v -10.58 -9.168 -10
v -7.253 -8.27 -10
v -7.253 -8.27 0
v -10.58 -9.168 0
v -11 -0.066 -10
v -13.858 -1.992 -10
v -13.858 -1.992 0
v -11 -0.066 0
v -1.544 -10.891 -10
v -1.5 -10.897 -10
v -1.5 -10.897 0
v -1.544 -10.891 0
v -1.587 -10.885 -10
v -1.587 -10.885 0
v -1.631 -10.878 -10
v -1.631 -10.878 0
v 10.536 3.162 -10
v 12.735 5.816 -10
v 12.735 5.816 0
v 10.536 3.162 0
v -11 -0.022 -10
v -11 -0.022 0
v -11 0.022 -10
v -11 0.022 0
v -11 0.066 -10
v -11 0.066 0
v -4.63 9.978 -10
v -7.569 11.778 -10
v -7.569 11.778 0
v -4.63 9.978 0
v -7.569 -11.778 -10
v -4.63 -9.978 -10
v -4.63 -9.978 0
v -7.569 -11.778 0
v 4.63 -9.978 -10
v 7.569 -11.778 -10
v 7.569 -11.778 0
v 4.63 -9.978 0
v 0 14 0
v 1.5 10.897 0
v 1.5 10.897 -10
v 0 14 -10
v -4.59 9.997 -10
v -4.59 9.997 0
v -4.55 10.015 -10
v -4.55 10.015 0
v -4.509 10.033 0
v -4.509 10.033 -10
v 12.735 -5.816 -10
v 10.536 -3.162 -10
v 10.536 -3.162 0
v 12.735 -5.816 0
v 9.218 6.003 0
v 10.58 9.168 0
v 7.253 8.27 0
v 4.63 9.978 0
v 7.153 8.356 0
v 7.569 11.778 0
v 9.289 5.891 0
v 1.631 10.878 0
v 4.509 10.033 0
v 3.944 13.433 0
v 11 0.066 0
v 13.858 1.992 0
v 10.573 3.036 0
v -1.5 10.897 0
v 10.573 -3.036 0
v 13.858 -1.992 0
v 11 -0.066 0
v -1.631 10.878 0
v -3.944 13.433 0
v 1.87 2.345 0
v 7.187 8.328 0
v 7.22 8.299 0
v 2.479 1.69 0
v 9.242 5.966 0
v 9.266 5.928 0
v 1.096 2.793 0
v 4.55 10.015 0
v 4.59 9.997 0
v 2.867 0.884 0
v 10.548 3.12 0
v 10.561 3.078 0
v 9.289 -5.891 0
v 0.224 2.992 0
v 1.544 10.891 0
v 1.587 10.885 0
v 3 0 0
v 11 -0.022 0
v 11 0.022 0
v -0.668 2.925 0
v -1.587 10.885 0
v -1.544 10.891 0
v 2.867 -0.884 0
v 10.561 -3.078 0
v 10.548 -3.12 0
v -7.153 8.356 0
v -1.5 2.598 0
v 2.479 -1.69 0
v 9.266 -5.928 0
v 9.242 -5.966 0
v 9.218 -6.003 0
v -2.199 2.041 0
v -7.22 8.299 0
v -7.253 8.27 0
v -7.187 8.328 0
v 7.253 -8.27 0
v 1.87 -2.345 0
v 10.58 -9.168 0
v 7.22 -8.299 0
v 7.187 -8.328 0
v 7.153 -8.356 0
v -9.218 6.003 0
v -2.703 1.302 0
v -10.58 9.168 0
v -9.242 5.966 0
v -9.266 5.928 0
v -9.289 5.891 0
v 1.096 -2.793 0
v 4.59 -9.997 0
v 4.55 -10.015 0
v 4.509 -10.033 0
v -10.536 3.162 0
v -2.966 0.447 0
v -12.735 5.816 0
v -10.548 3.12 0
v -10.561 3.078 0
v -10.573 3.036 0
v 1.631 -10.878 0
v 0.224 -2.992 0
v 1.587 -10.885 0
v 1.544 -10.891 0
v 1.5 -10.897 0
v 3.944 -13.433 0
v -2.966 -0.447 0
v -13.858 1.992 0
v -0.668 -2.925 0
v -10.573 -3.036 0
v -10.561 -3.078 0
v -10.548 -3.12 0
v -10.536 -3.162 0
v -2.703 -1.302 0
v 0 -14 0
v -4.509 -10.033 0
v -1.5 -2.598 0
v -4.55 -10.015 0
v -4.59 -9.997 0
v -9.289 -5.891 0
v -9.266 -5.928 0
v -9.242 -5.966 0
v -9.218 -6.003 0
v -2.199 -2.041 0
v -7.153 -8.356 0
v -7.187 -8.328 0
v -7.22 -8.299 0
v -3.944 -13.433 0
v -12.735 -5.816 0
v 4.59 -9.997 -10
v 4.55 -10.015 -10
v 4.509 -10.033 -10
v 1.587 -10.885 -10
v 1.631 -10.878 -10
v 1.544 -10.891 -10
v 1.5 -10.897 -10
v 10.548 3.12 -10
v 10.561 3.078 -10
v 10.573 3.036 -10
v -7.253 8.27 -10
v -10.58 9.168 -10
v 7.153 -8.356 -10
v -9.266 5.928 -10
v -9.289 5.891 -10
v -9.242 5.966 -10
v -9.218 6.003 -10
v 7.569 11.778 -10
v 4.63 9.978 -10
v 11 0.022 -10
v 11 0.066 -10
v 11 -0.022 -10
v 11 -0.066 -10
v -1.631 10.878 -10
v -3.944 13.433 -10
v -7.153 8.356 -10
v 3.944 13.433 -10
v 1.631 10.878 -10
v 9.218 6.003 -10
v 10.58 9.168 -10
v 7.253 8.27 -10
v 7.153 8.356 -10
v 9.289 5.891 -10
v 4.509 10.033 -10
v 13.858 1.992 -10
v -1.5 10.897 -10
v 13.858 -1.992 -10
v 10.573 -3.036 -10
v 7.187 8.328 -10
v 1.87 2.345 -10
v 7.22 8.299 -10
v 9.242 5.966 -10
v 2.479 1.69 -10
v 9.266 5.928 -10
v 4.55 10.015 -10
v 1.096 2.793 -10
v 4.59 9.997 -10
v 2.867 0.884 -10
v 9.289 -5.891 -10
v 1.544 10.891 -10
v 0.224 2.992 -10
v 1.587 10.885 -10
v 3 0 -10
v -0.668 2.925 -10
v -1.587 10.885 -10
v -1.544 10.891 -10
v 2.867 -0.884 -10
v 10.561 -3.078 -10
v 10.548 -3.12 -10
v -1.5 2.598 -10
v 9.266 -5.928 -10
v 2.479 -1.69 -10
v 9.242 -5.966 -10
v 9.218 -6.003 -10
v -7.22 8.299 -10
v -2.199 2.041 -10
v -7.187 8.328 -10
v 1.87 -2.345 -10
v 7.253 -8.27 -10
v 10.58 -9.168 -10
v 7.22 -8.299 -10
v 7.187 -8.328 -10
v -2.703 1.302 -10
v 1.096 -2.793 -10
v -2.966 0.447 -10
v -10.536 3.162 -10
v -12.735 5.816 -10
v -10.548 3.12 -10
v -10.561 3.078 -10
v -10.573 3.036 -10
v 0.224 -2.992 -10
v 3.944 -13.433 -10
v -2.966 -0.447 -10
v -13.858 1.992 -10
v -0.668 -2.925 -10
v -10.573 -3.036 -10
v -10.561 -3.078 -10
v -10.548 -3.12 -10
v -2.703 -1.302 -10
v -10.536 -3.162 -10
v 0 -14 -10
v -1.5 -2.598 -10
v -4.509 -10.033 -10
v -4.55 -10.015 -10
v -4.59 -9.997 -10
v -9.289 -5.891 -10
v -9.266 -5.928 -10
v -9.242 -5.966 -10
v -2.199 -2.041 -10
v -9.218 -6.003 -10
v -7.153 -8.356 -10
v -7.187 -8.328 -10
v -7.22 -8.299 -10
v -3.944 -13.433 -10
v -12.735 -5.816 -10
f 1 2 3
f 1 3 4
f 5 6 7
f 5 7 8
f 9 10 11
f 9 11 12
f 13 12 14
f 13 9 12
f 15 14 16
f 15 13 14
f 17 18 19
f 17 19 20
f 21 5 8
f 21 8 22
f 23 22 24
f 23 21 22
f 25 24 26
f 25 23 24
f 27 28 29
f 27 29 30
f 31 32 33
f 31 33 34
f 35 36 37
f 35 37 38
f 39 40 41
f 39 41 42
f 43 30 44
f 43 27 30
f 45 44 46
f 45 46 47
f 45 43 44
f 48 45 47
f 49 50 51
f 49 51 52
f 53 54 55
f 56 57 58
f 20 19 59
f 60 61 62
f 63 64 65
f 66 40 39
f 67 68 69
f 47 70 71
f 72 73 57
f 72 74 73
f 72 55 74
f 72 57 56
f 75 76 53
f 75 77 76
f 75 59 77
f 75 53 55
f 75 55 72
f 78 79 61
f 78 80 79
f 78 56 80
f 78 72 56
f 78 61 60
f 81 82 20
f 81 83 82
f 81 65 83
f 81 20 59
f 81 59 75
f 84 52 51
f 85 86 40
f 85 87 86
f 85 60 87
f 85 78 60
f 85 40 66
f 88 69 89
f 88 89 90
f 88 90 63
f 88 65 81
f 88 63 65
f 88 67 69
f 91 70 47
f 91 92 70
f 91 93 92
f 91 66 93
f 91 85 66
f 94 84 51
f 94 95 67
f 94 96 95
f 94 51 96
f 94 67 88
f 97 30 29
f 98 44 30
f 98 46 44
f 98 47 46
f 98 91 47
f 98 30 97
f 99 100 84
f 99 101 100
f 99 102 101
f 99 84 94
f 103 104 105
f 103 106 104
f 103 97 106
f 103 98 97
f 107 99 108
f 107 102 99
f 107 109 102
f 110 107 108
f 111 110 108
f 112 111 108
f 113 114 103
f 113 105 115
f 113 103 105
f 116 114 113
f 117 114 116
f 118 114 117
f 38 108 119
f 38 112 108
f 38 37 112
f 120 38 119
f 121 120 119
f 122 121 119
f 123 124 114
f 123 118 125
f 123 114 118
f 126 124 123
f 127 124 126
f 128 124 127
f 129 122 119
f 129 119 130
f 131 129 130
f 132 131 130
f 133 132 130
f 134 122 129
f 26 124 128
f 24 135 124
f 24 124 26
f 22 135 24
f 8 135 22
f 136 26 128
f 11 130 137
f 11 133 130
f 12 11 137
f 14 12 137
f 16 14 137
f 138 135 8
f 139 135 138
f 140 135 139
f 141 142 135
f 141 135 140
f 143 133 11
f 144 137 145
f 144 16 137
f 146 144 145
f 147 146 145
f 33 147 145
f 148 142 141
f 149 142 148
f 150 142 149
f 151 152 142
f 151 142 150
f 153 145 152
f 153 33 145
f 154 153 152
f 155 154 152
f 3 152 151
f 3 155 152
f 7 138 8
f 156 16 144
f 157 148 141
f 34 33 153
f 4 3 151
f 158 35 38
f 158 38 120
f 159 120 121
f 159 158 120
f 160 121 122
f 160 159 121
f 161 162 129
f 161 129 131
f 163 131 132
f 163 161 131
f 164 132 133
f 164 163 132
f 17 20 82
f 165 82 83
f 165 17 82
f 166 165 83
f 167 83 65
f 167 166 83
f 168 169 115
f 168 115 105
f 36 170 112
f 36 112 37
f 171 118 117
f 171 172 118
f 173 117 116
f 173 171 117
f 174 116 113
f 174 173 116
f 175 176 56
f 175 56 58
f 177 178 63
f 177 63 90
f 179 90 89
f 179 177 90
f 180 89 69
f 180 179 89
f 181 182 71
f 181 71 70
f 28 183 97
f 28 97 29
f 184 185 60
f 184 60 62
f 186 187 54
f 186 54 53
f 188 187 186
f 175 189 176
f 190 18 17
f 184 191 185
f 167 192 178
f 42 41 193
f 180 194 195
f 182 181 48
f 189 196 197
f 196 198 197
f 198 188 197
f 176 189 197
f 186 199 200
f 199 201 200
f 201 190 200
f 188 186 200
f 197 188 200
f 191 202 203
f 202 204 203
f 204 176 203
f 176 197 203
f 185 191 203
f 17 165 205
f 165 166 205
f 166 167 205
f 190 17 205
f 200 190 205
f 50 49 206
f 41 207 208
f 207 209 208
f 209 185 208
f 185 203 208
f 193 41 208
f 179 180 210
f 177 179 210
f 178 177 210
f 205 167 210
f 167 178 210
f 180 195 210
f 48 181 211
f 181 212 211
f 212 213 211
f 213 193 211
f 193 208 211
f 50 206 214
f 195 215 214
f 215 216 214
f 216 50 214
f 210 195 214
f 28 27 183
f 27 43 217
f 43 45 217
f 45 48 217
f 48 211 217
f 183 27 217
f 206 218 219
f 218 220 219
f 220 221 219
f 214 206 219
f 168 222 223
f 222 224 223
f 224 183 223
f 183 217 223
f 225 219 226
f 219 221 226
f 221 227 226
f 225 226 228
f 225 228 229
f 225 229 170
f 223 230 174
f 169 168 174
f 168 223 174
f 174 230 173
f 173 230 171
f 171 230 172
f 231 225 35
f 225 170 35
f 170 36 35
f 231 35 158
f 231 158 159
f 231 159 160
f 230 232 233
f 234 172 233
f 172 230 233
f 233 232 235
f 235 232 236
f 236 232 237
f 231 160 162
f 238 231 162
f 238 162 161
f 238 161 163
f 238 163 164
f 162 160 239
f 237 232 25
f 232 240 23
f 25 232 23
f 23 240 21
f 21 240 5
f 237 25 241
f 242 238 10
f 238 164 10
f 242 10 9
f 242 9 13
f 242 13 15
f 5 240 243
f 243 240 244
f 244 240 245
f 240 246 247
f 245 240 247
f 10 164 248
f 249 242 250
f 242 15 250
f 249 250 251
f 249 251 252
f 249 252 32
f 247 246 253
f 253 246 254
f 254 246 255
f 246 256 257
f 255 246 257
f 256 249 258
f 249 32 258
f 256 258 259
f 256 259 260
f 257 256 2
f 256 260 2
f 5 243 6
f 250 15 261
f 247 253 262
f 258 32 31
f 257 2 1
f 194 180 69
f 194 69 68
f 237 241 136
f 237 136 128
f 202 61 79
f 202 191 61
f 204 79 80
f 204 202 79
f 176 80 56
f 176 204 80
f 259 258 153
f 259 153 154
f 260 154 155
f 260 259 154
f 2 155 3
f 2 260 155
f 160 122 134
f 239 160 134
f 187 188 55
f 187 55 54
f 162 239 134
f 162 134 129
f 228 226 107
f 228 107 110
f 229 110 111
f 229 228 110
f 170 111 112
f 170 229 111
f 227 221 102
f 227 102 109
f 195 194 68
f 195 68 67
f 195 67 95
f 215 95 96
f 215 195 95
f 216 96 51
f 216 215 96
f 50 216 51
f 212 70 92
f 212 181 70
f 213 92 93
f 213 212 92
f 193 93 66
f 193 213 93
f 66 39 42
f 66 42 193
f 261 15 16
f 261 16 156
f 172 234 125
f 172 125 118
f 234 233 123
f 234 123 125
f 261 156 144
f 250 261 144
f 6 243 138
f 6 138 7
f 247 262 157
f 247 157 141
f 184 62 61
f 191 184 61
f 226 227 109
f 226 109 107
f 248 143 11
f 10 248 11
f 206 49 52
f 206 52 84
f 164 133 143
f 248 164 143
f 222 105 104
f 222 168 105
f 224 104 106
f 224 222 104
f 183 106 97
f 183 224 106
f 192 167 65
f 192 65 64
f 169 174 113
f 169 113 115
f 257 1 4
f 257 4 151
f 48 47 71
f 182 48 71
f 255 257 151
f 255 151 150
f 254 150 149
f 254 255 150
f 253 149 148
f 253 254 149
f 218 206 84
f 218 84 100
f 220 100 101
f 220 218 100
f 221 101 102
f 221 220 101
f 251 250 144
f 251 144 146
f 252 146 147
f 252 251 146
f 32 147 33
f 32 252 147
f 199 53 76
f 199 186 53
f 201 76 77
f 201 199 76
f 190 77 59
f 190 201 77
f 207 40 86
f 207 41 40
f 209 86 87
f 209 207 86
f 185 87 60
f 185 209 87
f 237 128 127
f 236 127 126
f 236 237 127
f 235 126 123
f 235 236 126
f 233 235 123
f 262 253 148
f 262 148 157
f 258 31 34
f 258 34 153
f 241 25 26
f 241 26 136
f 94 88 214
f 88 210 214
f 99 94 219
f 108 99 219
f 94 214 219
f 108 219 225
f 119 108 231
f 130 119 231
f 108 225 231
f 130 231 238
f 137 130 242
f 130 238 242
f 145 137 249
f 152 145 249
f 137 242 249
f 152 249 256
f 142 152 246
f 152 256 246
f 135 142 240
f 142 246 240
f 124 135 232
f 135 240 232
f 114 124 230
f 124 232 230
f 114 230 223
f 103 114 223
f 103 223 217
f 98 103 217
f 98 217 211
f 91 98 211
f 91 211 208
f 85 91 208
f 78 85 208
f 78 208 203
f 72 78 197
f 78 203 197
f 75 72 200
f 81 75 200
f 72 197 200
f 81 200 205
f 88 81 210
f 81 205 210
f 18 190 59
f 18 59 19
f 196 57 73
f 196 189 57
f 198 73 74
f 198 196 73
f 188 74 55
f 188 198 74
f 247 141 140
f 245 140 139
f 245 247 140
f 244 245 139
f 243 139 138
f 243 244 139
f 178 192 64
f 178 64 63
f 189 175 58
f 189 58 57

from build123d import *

# Parameters (mm, degrees)
ESQUISSE2_W        = 10
ESQUISSE2_H        = 8
BOSS_EXTRU_1_START = -10
BOSS_EXTRU_1_DEPTH = 10


with BuildPart() as part:
    # Esquisse2 → Révolution1 (revolve)
    with BuildSketch(Plane(origin=(0, 0, 0), x_dir=(0, 0, -1), z_dir=(1, 0, 0)), mode=Mode.PRIVATE) as r_volution1_sk:
        with Locations((5, 7)):
            Rectangle(ESQUISSE2_W, ESQUISSE2_H)
    revolve(r_volution1_sk.sketch.rotate(Axis((0, 0, 0), (0, 0, -1)), 90), axis=Axis((0, 0, 0), (0, 0, -1)))

    # Esquisse3 → Boss.-Extru.1 (add)
    with BuildSketch(Plane.XY.offset(BOSS_EXTRU_1_START)):
        with BuildLine():
            Line((0, 14), (-1.5, 10.897247359))
            ThreePointArc((-1.5, 10.897247359), (-0.751757625, 10.974281775), (0, 11))
            ThreePointArc((0, 11), (0.751757625, 10.974281775), (1.5, 10.897247359))
            Line((1.5, 10.897247359), (0, 14))
        make_face()
        with BuildLine():
            Line((3.944255796, 13.432901631), (4.509348821, 10.033233437))
            ThreePointArc((4.509348821, 10.033233437), (3.813118623, 10.317951656), (3.099058125, 10.55442271))
            ThreePointArc((3.099058125, 10.55442271), (2.370506305, 10.741540851), (1.630869901, 10.878431108))
            Line((1.630869901, 10.878431108), (3.944255796, 13.432901631))
        make_face()
        with BuildLine():
            Line((7.568971444, 11.77754946), (7.153377019, 8.356386613))
            ThreePointArc((7.153377019, 8.356386613), (6.565563427, 8.825722457), (5.947048992, 9.253788861))
            ThreePointArc((5.947048992, 9.253788861), (5.300725912, 9.63858417), (4.629616421, 9.978309065))
            Line((4.629616421, 9.978309065), (7.568971444, 11.77754946))
        make_face()
        with BuildLine():
            Line((10.580494041, 9.168050275), (9.217881154, 6.002555042))
            ThreePointArc((9.217881154, 6.002555042), (8.78610533, 6.618485713), (8.313245318, 7.203468073))
            ThreePointArc((8.313245318, 7.203468073), (7.80151223, 7.754766722), (7.253298952, 8.269803765))
            Line((7.253298952, 8.269803765), (10.580494041, 9.168050275))
        make_face()
        with BuildLine():
            Line((12.734847935, 5.815810182), (10.535607378, 3.16243216))
            ThreePointArc((10.535607378, 3.16243216), (10.294849232, 3.875058618), (10.005951949, 4.569565143))
            ThreePointArc((10.005951949, 4.569565143), (9.670266425, 5.242704194), (9.289362339, 5.891328146))
            Line((9.289362339, 5.891328146), (12.734847935, 5.815810182))
        make_face()
        with BuildLine():
            Line((13.857500186, 1.992407736), (10.999801351, 0.066107833))
            ThreePointArc((10.999801351, 0.066107833), (10.969565675, 0.81769732), (10.888035861, 1.565463221))
            ThreePointArc((10.888035861, 1.565463221), (10.755593145, 2.305908952), (10.572856836, 3.035572158))
            Line((10.572856836, 3.035572158), (13.857500186, 1.992407736))
        make_face()
        with BuildLine():
            Line((13.857500186, -1.992407736), (10.572856836, -3.035572158))
            ThreePointArc((10.572856836, -3.035572158), (10.755593145, -2.305908952), (10.888035861, -1.565463221))
            ThreePointArc((10.888035861, -1.565463221), (10.969565675, -0.81769732), (10.999801351, -0.066107833))
            Line((10.999801351, -0.066107833), (13.857500186, -1.992407736))
        make_face()
        with BuildLine():
            Line((12.734847935, -5.815810182), (9.289362339, -5.891328146))
            ThreePointArc((9.289362339, -5.891328146), (9.670266425, -5.242704194), (10.005951949, -4.569565143))
            ThreePointArc((10.005951949, -4.569565143), (10.294849232, -3.875058618), (10.535607378, -3.16243216))
            Line((10.535607378, -3.16243216), (12.734847935, -5.815810182))
        make_face()
        with BuildLine():
            Line((10.580494041, -9.168050275), (7.253298952, -8.269803765))
            ThreePointArc((7.253298952, -8.269803765), (7.80151223, -7.754766722), (8.313245318, -7.203468073))
            ThreePointArc((8.313245318, -7.203468073), (8.78610533, -6.618485713), (9.217881154, -6.002555042))
            Line((9.217881154, -6.002555042), (10.580494041, -9.168050275))
        make_face()
        with BuildLine():
            Line((7.568971444, -11.77754946), (4.629616421, -9.978309065))
            ThreePointArc((4.629616421, -9.978309065), (5.300725912, -9.63858417), (5.947048992, -9.253788861))
            ThreePointArc((5.947048992, -9.253788861), (6.565563427, -8.825722457), (7.153377019, -8.356386613))
            Line((7.153377019, -8.356386613), (7.568971444, -11.77754946))
        make_face()
        with BuildLine():
            Line((3.944255796, -13.432901631), (1.630869901, -10.878431108))
            ThreePointArc((1.630869901, -10.878431108), (2.370506305, -10.741540851), (3.099058125, -10.55442271))
            ThreePointArc((3.099058125, -10.55442271), (3.813118623, -10.317951656), (4.509348821, -10.033233437))
            Line((4.509348821, -10.033233437), (3.944255796, -13.432901631))
        make_face()
        with BuildLine():
            Line((0, -14), (-1.5, -10.897247359))
            ThreePointArc((-1.5, -10.897247359), (-0.751757625, -10.974281775), (0, -11))
            ThreePointArc((0, -11), (0.751757625, -10.974281775), (1.5, -10.897247359))
            Line((1.5, -10.897247359), (0, -14))
        make_face()
        with BuildLine():
            Line((-3.944255796, -13.432901631), (-4.509348821, -10.033233437))
            ThreePointArc((-4.509348821, -10.033233437), (-3.813118623, -10.317951656), (-3.099058125, -10.55442271))
            ThreePointArc((-3.099058125, -10.55442271), (-2.370506305, -10.741540851), (-1.630869901, -10.878431108))
            Line((-1.630869901, -10.878431108), (-3.944255796, -13.432901631))
        make_face()
        with BuildLine():
            Line((-7.568971444, -11.77754946), (-7.153377019, -8.356386613))
            ThreePointArc((-7.153377019, -8.356386613), (-6.565563427, -8.825722457), (-5.947048992, -9.253788861))
            ThreePointArc((-5.947048992, -9.253788861), (-5.300725912, -9.63858417), (-4.629616421, -9.978309065))
            Line((-4.629616421, -9.978309065), (-7.568971444, -11.77754946))
        make_face()
        with BuildLine():
            Line((-10.580494041, -9.168050275), (-9.217881154, -6.002555042))
            ThreePointArc((-9.217881154, -6.002555042), (-8.78610533, -6.618485713), (-8.313245318, -7.203468073))
            ThreePointArc((-8.313245318, -7.203468073), (-7.80151223, -7.754766722), (-7.253298952, -8.269803765))
            Line((-7.253298952, -8.269803765), (-10.580494041, -9.168050275))
        make_face()
        with BuildLine():
            Line((-12.734847935, -5.815810182), (-10.535607378, -3.16243216))
            ThreePointArc((-10.535607378, -3.16243216), (-10.294849232, -3.875058618), (-10.005951949, -4.569565143))
            ThreePointArc((-10.005951949, -4.569565143), (-9.670266425, -5.242704194), (-9.289362339, -5.891328146))
            Line((-9.289362339, -5.891328146), (-12.734847935, -5.815810182))
        make_face()
        with BuildLine():
            Line((-13.857500186, -1.992407736), (-10.999801351, -0.066107833))
            ThreePointArc((-10.999801351, -0.066107833), (-10.969565675, -0.81769732), (-10.888035861, -1.565463221))
            ThreePointArc((-10.888035861, -1.565463221), (-10.755593145, -2.305908952), (-10.572856836, -3.035572158))
            Line((-10.572856836, -3.035572158), (-13.857500186, -1.992407736))
        make_face()
        with BuildLine():
            Line((-13.857500186, 1.992407736), (-10.572856836, 3.035572158))
            ThreePointArc((-10.572856836, 3.035572158), (-10.755593145, 2.305908952), (-10.888035861, 1.565463221))
            ThreePointArc((-10.888035861, 1.565463221), (-10.969565675, 0.81769732), (-10.999801351, 0.066107833))
            Line((-10.999801351, 0.066107833), (-13.857500186, 1.992407736))
        make_face()
        with BuildLine():
            Line((-12.734847935, 5.815810182), (-9.289362339, 5.891328146))
            ThreePointArc((-9.289362339, 5.891328146), (-9.670266425, 5.242704194), (-10.005951949, 4.569565143))
            ThreePointArc((-10.005951949, 4.569565143), (-10.294849232, 3.875058618), (-10.535607378, 3.16243216))
            Line((-10.535607378, 3.16243216), (-12.734847935, 5.815810182))
        make_face()
        with BuildLine():
            Line((-10.580494041, 9.168050275), (-7.253298952, 8.269803765))
            ThreePointArc((-7.253298952, 8.269803765), (-7.80151223, 7.754766722), (-8.313245318, 7.203468073))
            ThreePointArc((-8.313245318, 7.203468073), (-8.78610533, 6.618485713), (-9.217881154, 6.002555042))
            Line((-9.217881154, 6.002555042), (-10.580494041, 9.168050275))
        make_face()
        with BuildLine():
            Line((-7.568971444, 11.77754946), (-4.629616421, 9.978309065))
            ThreePointArc((-4.629616421, 9.978309065), (-5.300725912, 9.63858417), (-5.947048992, 9.253788861))
            ThreePointArc((-5.947048992, 9.253788861), (-6.565563427, 8.825722457), (-7.153377019, 8.356386613))
            Line((-7.153377019, 8.356386613), (-7.568971444, 11.77754946))
        make_face()
        with BuildLine():
            Line((-3.944255796, 13.432901631), (-1.630869901, 10.878431108))
            ThreePointArc((-1.630869901, 10.878431108), (-2.370506305, 10.741540851), (-3.099058125, 10.55442271))
            ThreePointArc((-3.099058125, 10.55442271), (-3.813118623, 10.317951656), (-4.509348821, 10.033233437))
            Line((-4.509348821, 10.033233437), (-3.944255796, 13.432901631))
        make_face()
    extrude(amount=BOSS_EXTRU_1_DEPTH)


solid = part.part
